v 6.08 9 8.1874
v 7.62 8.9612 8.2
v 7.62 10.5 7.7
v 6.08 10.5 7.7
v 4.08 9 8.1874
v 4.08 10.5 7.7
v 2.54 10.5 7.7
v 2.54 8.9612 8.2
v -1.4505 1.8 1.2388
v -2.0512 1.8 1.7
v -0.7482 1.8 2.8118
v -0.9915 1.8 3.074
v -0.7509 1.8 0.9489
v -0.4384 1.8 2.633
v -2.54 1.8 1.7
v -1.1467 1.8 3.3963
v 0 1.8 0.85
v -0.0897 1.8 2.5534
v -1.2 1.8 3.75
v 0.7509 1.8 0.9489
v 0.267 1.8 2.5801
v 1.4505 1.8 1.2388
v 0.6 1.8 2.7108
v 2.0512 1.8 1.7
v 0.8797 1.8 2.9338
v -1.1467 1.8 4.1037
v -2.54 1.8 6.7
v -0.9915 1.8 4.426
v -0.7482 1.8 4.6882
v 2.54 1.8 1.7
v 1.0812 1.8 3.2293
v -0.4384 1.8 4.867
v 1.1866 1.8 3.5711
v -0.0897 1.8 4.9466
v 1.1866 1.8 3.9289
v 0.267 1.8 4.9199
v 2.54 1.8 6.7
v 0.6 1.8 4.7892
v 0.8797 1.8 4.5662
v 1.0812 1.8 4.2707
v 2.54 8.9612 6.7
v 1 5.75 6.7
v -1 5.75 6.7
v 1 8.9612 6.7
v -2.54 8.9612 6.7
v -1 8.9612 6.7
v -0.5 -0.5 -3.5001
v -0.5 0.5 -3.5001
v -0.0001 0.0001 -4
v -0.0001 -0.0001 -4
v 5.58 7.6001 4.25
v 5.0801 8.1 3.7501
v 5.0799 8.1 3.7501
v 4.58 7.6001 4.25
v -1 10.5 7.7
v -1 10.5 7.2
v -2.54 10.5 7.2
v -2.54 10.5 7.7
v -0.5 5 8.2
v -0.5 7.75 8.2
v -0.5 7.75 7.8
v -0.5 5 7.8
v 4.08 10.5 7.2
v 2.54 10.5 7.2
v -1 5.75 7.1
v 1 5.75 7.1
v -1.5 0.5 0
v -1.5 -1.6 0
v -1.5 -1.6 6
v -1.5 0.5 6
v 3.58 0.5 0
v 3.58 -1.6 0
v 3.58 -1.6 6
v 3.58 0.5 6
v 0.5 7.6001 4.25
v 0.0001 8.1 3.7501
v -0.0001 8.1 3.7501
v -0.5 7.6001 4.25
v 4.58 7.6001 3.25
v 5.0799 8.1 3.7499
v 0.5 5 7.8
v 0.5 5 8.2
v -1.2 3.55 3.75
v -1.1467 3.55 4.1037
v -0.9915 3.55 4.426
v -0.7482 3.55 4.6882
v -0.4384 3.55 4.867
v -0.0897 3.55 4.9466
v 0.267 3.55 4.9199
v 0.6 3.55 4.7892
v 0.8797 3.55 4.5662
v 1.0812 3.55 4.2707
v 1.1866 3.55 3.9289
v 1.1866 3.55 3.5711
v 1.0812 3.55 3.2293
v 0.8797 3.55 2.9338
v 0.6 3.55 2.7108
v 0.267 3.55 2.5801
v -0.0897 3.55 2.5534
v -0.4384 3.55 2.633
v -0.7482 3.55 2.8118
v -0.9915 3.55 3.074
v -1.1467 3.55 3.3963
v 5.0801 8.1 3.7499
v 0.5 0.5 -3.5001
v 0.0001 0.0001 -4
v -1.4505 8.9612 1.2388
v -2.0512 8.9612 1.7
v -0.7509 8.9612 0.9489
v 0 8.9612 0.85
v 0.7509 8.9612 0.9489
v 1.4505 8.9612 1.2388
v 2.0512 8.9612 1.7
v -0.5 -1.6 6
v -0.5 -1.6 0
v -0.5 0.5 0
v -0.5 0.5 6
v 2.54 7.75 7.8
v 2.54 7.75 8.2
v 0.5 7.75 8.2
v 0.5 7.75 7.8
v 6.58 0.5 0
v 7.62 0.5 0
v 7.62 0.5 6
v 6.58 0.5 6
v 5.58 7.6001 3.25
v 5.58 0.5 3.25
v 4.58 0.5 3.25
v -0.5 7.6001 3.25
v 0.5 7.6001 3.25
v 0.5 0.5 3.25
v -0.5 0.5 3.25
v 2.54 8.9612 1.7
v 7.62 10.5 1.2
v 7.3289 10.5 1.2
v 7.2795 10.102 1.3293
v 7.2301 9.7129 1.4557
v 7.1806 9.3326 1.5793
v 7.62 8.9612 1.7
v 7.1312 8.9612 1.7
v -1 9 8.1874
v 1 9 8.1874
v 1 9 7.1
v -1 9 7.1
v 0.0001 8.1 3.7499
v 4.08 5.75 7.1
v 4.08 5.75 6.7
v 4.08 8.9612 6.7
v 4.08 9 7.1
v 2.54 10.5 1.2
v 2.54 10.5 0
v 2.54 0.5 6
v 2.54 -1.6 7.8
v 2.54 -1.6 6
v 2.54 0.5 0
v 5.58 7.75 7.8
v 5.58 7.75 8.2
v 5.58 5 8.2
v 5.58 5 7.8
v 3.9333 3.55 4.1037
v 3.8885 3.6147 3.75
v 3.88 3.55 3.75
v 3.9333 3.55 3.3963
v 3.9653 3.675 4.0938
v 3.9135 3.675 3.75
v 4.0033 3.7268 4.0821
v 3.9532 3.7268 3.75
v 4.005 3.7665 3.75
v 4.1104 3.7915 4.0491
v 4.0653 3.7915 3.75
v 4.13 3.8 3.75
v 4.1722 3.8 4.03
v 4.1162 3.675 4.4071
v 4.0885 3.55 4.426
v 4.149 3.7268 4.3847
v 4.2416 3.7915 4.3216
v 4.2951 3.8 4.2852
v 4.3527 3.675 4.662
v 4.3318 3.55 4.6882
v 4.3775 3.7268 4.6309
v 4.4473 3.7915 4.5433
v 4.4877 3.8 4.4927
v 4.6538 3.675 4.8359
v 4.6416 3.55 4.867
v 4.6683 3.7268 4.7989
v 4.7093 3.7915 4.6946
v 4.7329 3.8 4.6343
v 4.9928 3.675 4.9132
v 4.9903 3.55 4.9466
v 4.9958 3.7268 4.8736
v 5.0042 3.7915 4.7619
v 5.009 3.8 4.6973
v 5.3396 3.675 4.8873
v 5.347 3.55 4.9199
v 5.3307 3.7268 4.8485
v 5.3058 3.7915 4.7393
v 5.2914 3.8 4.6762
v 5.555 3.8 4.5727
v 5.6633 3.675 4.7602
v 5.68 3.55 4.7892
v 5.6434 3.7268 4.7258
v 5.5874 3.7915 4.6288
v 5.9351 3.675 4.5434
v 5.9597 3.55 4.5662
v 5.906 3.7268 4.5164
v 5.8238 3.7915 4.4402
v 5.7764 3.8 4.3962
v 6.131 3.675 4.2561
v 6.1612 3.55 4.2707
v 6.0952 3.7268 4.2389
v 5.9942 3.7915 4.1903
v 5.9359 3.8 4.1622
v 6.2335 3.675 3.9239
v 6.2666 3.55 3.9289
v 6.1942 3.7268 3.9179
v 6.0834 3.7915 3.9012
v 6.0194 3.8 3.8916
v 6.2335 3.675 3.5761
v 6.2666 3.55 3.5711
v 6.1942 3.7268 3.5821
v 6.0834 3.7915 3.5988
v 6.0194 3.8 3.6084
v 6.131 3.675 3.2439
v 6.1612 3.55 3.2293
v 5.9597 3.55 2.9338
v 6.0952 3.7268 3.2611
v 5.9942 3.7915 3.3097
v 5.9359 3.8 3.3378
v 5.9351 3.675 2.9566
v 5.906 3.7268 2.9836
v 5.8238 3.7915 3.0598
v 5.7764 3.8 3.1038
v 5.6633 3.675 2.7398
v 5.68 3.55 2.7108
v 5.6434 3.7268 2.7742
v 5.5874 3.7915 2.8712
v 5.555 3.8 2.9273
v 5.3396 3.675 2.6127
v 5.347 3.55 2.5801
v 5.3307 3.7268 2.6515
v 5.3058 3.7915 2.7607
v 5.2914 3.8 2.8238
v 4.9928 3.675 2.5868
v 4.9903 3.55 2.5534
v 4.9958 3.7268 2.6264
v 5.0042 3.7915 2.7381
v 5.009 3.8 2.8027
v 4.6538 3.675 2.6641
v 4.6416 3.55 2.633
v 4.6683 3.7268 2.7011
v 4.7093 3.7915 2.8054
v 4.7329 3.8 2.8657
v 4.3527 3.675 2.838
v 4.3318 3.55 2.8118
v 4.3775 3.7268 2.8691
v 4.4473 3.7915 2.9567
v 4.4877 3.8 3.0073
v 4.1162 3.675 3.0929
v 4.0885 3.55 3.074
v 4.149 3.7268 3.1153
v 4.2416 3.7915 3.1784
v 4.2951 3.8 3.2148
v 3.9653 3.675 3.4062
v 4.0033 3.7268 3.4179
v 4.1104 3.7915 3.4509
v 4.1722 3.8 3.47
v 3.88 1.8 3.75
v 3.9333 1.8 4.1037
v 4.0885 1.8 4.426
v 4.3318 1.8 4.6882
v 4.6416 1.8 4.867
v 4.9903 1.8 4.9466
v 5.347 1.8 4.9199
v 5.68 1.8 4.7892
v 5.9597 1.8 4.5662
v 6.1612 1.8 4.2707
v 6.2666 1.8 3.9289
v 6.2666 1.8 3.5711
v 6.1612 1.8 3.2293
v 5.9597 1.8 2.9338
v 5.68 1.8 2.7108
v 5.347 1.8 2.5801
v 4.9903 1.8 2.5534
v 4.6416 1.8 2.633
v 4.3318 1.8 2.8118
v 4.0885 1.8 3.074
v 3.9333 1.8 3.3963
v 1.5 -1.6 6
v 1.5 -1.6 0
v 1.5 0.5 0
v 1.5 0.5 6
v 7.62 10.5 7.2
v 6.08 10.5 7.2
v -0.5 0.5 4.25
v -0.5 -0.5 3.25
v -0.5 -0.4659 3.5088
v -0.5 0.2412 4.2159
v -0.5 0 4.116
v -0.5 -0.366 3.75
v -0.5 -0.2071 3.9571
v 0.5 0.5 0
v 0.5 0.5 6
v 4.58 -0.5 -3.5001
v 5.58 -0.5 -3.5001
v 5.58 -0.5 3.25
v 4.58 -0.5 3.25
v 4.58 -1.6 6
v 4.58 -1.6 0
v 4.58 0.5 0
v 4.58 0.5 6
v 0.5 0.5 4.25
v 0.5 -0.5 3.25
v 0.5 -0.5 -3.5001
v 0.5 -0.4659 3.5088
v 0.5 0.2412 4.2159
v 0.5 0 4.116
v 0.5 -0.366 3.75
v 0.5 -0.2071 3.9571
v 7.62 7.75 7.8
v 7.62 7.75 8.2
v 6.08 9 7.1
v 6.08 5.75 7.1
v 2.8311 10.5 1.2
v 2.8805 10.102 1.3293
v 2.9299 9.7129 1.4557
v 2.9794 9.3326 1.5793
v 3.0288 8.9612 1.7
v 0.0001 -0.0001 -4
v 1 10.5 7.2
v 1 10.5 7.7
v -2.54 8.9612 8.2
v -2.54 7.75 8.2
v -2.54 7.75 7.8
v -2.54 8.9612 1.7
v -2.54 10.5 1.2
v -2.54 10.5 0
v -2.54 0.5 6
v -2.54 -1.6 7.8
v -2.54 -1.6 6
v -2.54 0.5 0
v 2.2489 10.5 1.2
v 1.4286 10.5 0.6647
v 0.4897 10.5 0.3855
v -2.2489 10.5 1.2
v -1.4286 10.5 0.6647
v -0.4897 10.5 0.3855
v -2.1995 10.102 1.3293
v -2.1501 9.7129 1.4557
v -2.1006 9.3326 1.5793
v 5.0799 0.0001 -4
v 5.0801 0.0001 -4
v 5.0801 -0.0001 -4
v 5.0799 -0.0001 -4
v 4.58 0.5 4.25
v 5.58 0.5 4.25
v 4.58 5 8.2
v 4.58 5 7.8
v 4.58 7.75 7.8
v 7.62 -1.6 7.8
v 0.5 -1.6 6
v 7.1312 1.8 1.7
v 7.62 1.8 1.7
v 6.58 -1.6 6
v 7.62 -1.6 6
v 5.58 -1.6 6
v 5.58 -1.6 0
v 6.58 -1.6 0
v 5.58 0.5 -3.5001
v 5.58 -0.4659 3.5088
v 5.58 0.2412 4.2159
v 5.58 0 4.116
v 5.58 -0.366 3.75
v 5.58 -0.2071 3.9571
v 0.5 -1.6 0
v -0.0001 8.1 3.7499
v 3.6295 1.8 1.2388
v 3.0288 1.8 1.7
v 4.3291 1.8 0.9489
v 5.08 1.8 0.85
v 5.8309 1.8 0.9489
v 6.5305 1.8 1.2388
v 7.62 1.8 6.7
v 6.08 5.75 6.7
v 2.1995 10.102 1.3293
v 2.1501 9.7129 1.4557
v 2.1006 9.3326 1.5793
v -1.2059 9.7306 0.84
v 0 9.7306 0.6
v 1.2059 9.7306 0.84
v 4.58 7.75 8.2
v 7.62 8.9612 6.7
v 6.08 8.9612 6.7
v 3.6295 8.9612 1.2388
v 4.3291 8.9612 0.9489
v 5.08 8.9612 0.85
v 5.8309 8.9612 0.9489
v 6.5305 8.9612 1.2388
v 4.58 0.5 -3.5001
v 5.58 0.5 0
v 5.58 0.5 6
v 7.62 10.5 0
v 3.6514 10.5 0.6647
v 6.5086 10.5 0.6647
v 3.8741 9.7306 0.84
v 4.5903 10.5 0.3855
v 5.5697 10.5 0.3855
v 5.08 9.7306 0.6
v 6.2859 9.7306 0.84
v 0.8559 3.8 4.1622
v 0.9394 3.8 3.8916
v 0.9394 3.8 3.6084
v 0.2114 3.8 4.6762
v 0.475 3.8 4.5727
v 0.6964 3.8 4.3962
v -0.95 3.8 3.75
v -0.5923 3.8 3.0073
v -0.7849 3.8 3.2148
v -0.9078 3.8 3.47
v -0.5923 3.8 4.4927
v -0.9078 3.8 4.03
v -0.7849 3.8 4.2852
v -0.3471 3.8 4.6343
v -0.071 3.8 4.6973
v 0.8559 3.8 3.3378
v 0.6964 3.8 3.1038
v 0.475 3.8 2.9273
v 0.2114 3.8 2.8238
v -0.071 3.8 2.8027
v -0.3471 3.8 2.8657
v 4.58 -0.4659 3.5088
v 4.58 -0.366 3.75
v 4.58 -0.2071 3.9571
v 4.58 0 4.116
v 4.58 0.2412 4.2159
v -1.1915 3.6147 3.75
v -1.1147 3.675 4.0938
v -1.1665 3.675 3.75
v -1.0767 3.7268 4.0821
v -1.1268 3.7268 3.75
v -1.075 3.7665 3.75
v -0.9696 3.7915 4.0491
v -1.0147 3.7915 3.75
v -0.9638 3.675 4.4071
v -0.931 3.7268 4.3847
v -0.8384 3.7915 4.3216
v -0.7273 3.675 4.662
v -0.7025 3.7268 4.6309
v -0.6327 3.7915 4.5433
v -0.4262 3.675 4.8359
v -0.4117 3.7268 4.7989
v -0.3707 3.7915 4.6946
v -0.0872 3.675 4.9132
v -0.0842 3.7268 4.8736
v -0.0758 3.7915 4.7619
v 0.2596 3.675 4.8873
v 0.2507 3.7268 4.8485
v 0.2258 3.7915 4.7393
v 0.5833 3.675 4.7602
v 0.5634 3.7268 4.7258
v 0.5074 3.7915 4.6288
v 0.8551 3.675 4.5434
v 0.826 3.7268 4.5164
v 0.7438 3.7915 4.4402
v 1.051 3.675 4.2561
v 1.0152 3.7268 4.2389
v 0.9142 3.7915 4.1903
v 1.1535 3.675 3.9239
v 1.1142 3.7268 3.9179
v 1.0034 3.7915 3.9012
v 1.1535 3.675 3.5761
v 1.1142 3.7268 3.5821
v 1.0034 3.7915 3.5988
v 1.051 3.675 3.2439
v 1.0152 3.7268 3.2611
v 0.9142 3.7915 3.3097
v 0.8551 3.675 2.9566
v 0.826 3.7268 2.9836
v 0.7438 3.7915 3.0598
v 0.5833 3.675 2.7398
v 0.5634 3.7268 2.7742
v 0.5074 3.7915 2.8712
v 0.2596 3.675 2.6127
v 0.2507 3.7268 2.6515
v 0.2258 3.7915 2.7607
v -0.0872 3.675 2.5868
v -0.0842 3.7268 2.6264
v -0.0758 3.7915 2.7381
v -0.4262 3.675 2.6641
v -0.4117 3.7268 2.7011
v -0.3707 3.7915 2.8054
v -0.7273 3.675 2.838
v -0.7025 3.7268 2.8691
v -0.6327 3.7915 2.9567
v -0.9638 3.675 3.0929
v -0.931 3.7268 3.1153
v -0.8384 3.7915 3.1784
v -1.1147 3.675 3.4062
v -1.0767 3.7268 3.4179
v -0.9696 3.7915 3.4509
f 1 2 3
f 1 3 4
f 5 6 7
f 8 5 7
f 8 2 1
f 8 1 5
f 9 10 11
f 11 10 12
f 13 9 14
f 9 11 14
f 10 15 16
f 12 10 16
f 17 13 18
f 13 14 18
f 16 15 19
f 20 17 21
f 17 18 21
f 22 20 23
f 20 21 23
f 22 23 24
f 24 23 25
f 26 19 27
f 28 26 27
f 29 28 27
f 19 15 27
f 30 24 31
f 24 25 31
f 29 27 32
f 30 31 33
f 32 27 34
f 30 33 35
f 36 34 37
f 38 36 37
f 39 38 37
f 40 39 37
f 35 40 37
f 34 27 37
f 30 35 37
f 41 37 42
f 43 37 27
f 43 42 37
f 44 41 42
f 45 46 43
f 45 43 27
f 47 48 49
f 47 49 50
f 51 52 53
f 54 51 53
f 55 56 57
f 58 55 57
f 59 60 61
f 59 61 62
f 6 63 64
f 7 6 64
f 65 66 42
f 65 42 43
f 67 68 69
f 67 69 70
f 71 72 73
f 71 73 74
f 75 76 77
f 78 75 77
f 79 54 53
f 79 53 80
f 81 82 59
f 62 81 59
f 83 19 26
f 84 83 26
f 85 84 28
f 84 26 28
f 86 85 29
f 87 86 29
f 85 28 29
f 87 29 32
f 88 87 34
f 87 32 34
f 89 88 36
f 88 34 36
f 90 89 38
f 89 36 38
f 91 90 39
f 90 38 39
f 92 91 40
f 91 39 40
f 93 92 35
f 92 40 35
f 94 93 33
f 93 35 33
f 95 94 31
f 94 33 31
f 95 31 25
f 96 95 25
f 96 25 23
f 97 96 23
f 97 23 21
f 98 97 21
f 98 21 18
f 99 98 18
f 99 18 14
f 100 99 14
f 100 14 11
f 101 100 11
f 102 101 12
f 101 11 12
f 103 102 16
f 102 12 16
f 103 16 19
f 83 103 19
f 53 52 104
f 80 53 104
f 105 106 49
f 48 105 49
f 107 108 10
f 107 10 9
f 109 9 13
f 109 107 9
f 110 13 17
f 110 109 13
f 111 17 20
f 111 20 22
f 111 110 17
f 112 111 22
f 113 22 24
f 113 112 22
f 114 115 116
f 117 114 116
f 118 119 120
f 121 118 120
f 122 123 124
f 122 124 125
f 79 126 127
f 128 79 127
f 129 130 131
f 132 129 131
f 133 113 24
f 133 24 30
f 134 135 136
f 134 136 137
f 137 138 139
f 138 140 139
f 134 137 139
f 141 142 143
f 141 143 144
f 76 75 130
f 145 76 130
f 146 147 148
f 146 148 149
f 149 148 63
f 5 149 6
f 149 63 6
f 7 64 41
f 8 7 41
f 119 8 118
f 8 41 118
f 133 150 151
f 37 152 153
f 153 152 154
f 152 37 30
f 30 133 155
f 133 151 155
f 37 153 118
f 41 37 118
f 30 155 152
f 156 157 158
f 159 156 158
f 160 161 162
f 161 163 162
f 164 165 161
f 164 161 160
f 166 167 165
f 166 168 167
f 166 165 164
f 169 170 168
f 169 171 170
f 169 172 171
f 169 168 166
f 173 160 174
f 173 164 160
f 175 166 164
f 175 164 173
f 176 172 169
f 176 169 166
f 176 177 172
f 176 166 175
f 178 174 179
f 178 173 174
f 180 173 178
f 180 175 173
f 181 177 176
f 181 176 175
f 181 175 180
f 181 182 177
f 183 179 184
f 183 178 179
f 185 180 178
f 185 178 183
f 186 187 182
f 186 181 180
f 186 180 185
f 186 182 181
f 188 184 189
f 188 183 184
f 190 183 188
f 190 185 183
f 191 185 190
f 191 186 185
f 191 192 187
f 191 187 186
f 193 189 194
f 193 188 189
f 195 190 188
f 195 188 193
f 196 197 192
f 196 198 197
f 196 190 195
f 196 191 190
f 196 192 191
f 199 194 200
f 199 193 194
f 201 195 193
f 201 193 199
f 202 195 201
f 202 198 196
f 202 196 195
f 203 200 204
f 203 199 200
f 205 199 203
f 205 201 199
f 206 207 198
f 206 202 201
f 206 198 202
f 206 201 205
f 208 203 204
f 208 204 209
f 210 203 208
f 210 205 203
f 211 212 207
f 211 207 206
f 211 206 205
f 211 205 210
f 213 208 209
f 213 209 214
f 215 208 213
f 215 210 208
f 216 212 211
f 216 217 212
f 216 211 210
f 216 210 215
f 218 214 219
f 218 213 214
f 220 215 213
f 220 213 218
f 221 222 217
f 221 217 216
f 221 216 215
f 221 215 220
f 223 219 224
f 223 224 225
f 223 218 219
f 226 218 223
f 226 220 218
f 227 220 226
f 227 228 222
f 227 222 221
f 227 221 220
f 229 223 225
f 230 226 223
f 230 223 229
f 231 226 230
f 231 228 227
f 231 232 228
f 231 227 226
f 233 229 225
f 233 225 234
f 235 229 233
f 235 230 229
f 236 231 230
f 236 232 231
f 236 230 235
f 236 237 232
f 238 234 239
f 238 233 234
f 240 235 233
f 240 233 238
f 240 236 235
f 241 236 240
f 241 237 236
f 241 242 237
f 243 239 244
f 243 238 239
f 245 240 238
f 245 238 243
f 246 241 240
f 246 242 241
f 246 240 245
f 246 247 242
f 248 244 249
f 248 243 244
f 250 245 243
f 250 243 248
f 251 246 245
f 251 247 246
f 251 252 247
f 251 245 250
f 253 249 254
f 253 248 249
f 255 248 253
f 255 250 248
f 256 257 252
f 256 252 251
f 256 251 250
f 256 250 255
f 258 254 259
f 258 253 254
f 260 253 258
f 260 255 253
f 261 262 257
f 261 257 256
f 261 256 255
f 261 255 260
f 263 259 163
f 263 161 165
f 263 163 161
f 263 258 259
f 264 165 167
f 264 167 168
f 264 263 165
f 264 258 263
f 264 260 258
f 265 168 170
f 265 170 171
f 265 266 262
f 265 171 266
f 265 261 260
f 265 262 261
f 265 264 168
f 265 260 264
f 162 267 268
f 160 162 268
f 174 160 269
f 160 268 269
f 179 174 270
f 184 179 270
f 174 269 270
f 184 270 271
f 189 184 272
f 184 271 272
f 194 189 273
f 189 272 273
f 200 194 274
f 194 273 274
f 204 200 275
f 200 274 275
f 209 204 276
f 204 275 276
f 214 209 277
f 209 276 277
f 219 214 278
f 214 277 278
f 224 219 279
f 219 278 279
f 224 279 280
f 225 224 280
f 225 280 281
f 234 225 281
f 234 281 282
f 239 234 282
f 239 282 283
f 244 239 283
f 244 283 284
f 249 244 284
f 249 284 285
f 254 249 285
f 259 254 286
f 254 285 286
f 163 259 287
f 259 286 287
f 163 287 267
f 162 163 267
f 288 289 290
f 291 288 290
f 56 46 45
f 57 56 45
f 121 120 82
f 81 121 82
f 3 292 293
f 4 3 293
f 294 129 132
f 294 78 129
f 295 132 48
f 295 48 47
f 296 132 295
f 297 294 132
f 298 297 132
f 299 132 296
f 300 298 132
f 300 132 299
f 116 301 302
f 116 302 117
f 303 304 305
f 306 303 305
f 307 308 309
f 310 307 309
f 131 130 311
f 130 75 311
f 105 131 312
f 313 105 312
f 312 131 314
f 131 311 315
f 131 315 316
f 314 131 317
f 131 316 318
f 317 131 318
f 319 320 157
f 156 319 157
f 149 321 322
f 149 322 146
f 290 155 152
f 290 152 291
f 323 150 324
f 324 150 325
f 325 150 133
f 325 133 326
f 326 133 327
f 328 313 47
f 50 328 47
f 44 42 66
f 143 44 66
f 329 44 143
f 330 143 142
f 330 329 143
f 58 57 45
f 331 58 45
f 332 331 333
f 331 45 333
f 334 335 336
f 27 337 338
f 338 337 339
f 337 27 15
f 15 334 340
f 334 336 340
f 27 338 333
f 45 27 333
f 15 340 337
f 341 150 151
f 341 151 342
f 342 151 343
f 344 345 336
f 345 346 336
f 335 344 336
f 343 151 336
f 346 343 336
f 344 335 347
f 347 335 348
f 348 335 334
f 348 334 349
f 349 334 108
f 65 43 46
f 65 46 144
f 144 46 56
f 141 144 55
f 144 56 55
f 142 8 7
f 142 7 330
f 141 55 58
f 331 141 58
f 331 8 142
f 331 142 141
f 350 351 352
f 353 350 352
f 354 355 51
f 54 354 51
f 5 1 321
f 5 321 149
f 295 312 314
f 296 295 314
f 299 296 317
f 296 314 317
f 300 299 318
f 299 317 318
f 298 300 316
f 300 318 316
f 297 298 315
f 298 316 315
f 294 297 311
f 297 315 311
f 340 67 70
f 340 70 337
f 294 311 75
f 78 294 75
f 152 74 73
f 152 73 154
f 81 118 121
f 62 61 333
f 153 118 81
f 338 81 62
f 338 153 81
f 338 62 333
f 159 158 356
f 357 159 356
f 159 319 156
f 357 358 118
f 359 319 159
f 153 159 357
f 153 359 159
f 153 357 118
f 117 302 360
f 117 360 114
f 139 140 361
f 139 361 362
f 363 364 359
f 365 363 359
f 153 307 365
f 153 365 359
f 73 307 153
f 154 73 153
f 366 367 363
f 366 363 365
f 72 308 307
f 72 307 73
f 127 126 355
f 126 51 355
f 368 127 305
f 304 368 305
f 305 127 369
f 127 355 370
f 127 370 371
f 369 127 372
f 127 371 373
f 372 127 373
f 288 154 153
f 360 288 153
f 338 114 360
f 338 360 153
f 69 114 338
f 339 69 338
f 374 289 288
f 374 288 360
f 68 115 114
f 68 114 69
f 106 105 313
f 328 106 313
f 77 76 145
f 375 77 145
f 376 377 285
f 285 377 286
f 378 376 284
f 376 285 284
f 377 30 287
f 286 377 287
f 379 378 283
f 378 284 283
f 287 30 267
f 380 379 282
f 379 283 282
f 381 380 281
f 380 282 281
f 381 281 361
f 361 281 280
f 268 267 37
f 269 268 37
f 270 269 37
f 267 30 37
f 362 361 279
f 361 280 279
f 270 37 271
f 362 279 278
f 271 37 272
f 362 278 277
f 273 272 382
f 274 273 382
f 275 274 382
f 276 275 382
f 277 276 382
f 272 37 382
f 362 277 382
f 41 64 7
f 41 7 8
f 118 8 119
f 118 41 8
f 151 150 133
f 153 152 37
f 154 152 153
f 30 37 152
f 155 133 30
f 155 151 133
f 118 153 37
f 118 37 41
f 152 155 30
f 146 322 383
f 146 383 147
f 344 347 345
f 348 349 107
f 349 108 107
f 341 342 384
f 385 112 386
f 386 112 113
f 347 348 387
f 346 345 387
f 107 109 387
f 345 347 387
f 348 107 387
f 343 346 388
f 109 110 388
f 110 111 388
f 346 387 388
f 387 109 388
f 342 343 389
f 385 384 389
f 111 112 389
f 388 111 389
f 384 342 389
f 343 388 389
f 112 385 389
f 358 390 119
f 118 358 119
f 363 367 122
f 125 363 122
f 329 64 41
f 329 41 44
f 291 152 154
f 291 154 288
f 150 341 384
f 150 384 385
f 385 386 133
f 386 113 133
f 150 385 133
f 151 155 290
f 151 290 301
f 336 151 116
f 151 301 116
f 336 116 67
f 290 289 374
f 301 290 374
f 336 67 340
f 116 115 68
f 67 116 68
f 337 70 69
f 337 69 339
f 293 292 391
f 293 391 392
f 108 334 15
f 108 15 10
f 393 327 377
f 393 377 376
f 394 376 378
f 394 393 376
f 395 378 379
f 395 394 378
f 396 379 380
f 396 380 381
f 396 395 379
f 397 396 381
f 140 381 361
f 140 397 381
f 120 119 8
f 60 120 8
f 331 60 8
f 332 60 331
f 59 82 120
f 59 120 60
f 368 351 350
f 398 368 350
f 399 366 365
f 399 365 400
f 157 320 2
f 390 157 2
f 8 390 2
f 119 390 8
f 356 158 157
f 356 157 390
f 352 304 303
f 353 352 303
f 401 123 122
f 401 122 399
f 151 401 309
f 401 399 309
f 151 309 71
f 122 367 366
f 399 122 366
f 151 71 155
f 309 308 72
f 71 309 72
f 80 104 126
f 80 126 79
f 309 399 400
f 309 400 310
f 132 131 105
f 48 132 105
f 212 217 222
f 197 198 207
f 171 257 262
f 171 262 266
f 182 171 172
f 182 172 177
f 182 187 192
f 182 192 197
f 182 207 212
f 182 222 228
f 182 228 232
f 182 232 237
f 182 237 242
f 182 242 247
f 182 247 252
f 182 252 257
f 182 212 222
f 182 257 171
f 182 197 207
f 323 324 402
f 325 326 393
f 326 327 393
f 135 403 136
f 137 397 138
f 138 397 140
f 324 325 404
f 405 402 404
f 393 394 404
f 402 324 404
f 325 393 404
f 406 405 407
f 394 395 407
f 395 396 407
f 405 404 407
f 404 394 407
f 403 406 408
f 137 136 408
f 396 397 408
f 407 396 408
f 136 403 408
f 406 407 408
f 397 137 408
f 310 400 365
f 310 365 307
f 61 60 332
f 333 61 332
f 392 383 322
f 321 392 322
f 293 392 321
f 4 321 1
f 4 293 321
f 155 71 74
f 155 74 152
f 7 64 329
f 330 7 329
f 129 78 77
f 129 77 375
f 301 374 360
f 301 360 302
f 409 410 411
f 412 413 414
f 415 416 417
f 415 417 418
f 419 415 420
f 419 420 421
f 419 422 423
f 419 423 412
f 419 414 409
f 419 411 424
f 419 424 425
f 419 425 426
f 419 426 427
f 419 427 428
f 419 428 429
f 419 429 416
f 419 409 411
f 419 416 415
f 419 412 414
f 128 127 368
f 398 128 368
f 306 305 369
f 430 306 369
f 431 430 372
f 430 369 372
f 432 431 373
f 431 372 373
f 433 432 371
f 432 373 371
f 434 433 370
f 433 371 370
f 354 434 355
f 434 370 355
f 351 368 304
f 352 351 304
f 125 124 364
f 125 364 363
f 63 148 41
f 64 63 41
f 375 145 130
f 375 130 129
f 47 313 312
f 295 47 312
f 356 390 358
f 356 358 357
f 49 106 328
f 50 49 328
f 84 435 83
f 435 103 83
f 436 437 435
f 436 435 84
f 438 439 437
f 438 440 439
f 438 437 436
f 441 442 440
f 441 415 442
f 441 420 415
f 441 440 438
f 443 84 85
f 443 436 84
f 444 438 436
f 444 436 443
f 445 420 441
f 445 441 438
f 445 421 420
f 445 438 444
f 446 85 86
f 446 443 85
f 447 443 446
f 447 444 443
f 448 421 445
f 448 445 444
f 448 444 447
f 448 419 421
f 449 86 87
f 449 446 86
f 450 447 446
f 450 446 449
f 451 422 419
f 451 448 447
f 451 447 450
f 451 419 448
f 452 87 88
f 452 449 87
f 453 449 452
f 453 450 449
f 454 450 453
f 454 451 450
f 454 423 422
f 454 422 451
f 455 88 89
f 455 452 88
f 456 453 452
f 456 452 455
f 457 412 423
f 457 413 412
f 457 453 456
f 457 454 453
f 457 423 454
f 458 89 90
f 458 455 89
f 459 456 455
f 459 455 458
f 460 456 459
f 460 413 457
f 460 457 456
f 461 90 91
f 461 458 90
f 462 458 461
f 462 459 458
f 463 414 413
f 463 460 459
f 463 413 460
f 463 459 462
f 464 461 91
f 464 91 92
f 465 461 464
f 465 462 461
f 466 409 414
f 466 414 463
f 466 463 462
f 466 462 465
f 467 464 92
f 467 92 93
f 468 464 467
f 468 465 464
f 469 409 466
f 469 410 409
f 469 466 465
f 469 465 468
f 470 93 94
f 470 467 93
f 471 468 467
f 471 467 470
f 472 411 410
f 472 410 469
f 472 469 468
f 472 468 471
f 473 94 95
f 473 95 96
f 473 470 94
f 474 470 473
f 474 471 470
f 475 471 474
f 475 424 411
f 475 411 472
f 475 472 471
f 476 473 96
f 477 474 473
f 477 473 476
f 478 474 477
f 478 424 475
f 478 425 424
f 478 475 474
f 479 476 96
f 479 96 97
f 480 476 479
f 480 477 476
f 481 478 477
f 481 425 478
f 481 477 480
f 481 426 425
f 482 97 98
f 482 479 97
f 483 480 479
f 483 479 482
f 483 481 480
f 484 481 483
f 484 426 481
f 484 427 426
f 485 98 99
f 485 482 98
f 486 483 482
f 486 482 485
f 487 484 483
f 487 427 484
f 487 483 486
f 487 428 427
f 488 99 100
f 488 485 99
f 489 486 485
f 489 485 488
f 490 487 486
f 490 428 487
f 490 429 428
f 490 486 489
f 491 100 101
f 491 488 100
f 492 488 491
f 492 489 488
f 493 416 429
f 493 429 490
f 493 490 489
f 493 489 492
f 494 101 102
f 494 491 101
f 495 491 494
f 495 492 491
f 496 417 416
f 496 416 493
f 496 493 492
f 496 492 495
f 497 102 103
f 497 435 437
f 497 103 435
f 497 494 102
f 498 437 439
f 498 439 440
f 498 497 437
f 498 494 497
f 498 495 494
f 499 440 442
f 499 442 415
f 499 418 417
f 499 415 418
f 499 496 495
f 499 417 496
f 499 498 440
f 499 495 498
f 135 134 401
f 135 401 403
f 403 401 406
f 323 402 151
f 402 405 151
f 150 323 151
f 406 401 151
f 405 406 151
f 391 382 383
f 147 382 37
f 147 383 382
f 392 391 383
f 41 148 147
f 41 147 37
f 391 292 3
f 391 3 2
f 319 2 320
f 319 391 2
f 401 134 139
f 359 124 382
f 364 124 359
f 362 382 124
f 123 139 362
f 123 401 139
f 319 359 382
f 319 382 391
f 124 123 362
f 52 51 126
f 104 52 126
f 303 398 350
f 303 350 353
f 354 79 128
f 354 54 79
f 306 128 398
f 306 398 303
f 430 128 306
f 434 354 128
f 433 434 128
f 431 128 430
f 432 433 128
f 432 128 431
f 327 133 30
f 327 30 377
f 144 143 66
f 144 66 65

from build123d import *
from OCP.BRepFilletAPI import BRepFilletAPI_MakeChamfer

# Parameters (mm, degrees)
SKETCH_1_W             = 5.08
SKETCH_1_H             = 12.1
EXTRUDE_1_DEPTH        = 8.2
CUT_EXTRUDE_1_DEPTH    = 8.7
SKETCH_3_R             = 1.2
EXTRUDE_2_DEPTH        = 2
FILLET_1_R             = 0.25
CHAMFER_1_SIZE         = 0.5
CHAMFER_1_SIZE2        = 1.538841769
SKETCH_4_W             = 2
SKETCH_4_H             = 1.010953213
CUT_EXTRUDE_2_DEPTH    = 4.75
SKETCH_5_W             = 2
SKETCH_5_H             = 1.705458635
CUT_EXTRUDE_3_DEPTH    = 1.5
CHAMFER_2_SIZE         = 0.5
CHAMFER_2_SIZE2        = 1.538841769
SKETCH_6_W             = 5.08
SKETCH_6_H             = 6.6
CUT_EXTRUDE_4_DEPTH    = 0.4
SKETCH_7_W             = 2.04
SKETCH_7_H             = 2.75
CUT_EXTRUDE_5_DEPTH    = 0.4
EXTRUDE_1_2_DEPTH      = 0.5
EXTRUDE_1_2_DEPTH_BACK = 0.5
CHAMFER_3_SIZE         = 0.5
SKETCH_9_W             = 1
SKETCH_9_H             = 2.1
SKETCH_9_W_2           = 1.04
CUT_EXTRUDE_6_DEPTH    = 6
PATTERN_LINEAR_1_COUNT = 2
PATTERN_LINEAR_1_PITCH = 5.08
MOVE_BODY_1_ANGLE      = 180


with BuildPart() as part:
    # Эскиз1 → Extrude 1 (new body)
    with BuildSketch(Plane(origin=(0, 0, 0), x_dir=(1, 0, 0), z_dir=(0, 1, 0))):
        Rectangle(SKETCH_1_W, SKETCH_1_H)
    extrude(amount=EXTRUDE_1_DEPTH)

    # Эскиз2 → Вырез-Вытянуть1 (cut)
    with BuildSketch(Plane.XY.offset(6.05)):
        with BuildLine():
            Line((-2.54, 6.7), (2.54, 6.7))
            Line((2.54, 6.7), (2.54, 1.7))
            Line((2.54, 1.7), (2.05121915, 1.7))
            ThreePointArc((2.05121915, 1.7), (0, 0.85), (-2.05121915, 1.7))
            Line((-2.05121915, 1.7), (-2.54, 1.7))
            Line((-2.54, 1.7), (-2.54, 6.7))
        make_face()
    extrude(amount=-CUT_EXTRUDE_1_DEPTH, mode=Mode.SUBTRACT)

    # Эскиз3 → Бобышка-Вытянуть2 (add)
    with BuildSketch(Plane.XY.offset(-2.65)):
        with Locations((0, 3.75)):
            Circle(SKETCH_3_R)
    extrude(amount=EXTRUDE_2_DEPTH)

    # Скругление1
    fillet_1_edges = [part.edges().sort_by_distance(p)[0] for p in [
        (-1.2, 3.75, -0.65),
    ]]
    fillet(fillet_1_edges, radius=FILLET_1_R)

    # Фаска1: one chamfer whose edges measure the first distance from different faces: ONE call of the kernel's chamfer builder (chamfer() names one face for all edges)
    chamfer_1_edges_1 = [part.edges().sort_by_distance(p)[0] for p in [
        (0, 6.7, 6.05),
    ]]
    chamfer_1_side_1 = [part.faces().sort_by_distance(p)[0] for p in [
        (0, 7.45, 6.05),
    ]]
    chamfer_1_edges_2 = [part.edges().sort_by_distance(p)[0] for p in [
        (2.295609575, 1.7, 6.05),
        (-2.295609575, 1.7, 6.05),
        (0, 0.85, 6.05),
    ]]
    chamfer_1_side_2 = [part.faces().sort_by_distance(p)[0] for p in [
        (0, 0.655214235, 6.05),
    ]]
    chamfer_1 = BRepFilletAPI_MakeChamfer(part.part.solid().wrapped)
    for e in chamfer_1_edges_1:
        chamfer_1.Add(CHAMFER_1_SIZE, CHAMFER_1_SIZE2, e.wrapped, chamfer_1_side_1[0].wrapped)  # the first distance lies on this face
    for e in chamfer_1_edges_2:
        chamfer_1.Add(CHAMFER_1_SIZE, CHAMFER_1_SIZE2, e.wrapped, chamfer_1_side_2[0].wrapped)  # the first distance lies on this face
    add(Compound.cast(chamfer_1.Shape()), mode=Mode.REPLACE)

    # Эскиз4 → Вырез-Вытянуть2 (cut)
    with BuildSketch(Plane.XY.offset(6.05)):
        with Locations((0, 6.594523394)):
            Rectangle(SKETCH_4_W, SKETCH_4_H)
    extrude(amount=-CUT_EXTRUDE_2_DEPTH, mode=Mode.SUBTRACT)

    # Эскиз5 → Вырез-Вытянуть3 (cut)
    with BuildSketch(Plane.XY.offset(6.05)):
        with Locations((0, 7.552729318)):
            Rectangle(SKETCH_5_W, SKETCH_5_H)
    extrude(amount=-CUT_EXTRUDE_3_DEPTH, mode=Mode.SUBTRACT)

    # Фаска2
    chamfer_2_edges = [part.edges().sort_by_distance(p)[0] for p in [
        (-1.77, 8.2, 6.05),
    ]]
    chamfer_2_side = [part.faces().sort_by_distance(p)[0] for p in [
        (-1.77, 7.7, 6.05),
    ]]
    chamfer(chamfer_2_edges, length=CHAMFER_2_SIZE, length2=CHAMFER_2_SIZE2, reference=chamfer_2_side[0])

    # Эскиз6 → Вырез-Вытянуть4 (cut)
    with BuildSketch(Plane(origin=(0, 8.2, 0), x_dir=(1, 0, 0), z_dir=(0, 1, 0))):
        with Locations((0, 2.75)):
            Rectangle(SKETCH_6_W, SKETCH_6_H)
    extrude(amount=-CUT_EXTRUDE_4_DEPTH, mode=Mode.SUBTRACT)

    # Эскиз7 → Вырез-Вытянуть5 (cut)
    with BuildSketch(Plane(origin=(0, 8.2, 0), x_dir=(1, 0, 0), z_dir=(0, 1, 0))):
        with Locations((1.52, -1.925)):
            Rectangle(SKETCH_7_W, SKETCH_7_H)
        with Locations((-1.52, -1.925)):
            Rectangle(SKETCH_7_W, SKETCH_7_H)
    extrude(amount=-CUT_EXTRUDE_5_DEPTH, mode=Mode.SUBTRACT)

    # Эскиз9 → Вырез-Вытянуть6 (cut)
    with BuildSketch(Plane.XZ):
        with Locations((0, -5)):
            Rectangle(SKETCH_9_W, SKETCH_9_H)
        with Locations((-2.02, -5)):
            Rectangle(SKETCH_9_W_2, SKETCH_9_H)
        with Locations((2.02, -5)):
            Rectangle(SKETCH_9_W_2, SKETCH_9_H)
    extrude(amount=-CUT_EXTRUDE_6_DEPTH, mode=Mode.SUBTRACT)


with BuildPart() as body_2:
    # Эскиз8 → Extrude 1 2 (new, two sides: drawn at the far end of the back side and taken through both)
    with BuildSketch(Plane(origin=(0, 0, 0), x_dir=(0, 0, -1), z_dir=(1, 0, 0)).offset(-EXTRUDE_1_2_DEPTH_BACK)):
        with BuildLine():
            Line((-3.65, 3.25), (3.95, 3.25))
            Line((3.95, 3.25), (3.95, -4))
            Line((3.95, -4), (4.95, -4))
            Line((4.95, -4), (4.95, 3.25))
            ThreePointArc((4.95, 3.25), (4.657106781, 3.957106781), (3.95, 4.25))
            Line((3.95, 4.25), (-3.65, 4.25))
            Line((-3.65, 4.25), (-3.65, 3.25))
        make_face()
    extrude(amount=EXTRUDE_1_2_DEPTH + EXTRUDE_1_2_DEPTH_BACK)

    # Фаска3
    chamfer_3_edges = [body_2.edges().sort_by_distance(p)[0] for p in [
        (0, 3.25, 3.65),
        (0, 4.25, 3.65),
        (0, -4, -4.95),
        (0, -4, -3.95),
        (0.5, -4, -4.45),
        (0.5, 3.75, 3.65),
        (-0.5, 3.75, 3.65),
        (-0.5, -4, -4.45),
    ]]
    chamfer(chamfer_3_edges, length=CHAMFER_3_SIZE - 0.0001)  # a hair under: the kernel refuses the full size


with BuildPart() as pattern_linear_1_1:
    # Линейный массив1: pattern copy
    add(body_2.part.moved(Location(Vector(-1, 0, 0) * (1 * PATTERN_LINEAR_1_PITCH))))


with BuildPart() as pattern_linear_1_2:
    # Линейный массив1: pattern copy
    add(part.part.moved(Location(Vector(-1, 0, 0) * (1 * PATTERN_LINEAR_1_PITCH))))


with BuildPart() as body_2_1:
    # Move Body 1: moved
    add(body_2.part.rotate(Axis((0, 0, 0), (0, 0.7071067811865488, 0.7071067811865462)), MOVE_BODY_1_ANGLE))


with BuildPart() as part_1:
    # Move Body 1: moved
    add(part.part.rotate(Axis((0, 0, 0), (0, 0.7071067811865488, 0.7071067811865462)), MOVE_BODY_1_ANGLE))


with BuildPart() as pattern_linear_1_1_1:
    # Move Body 1: moved
    add(pattern_linear_1_1.part.rotate(Axis((0, 0, 0), (0, 0.7071067811865488, 0.7071067811865462)), MOVE_BODY_1_ANGLE))


with BuildPart() as pattern_linear_1_2_1:
    # Move Body 1: moved
    add(pattern_linear_1_2.part.rotate(Axis((0, 0, 0), (0, 0.7071067811865488, 0.7071067811865462)), MOVE_BODY_1_ANGLE))


with BuildPart() as pattern_linear_1_2_2:
    # Move Body 2: read off the stored shape, not the designer's step
    # Move Body 2: moved
    add(pattern_linear_1_2_1.part.moved(Location((0, 4.45, 0))))


with BuildPart() as pattern_linear_1_1_2:
    # Move Body 2 2: moved
    add(pattern_linear_1_1_1.part.moved(Location((0, 4.45, 0))))


with BuildPart() as part_2:
    # Move Body 2 3: moved
    add(part_1.part.moved(Location((0, 4.45, 0))))


with BuildPart() as body_2_2:
    # Move Body 2 4: moved
    add(body_2_1.part.moved(Location((0, 4.45, 0))))


solid = Compound([pattern_linear_1_2_2.part, pattern_linear_1_1_2.part, part_2.part, body_2_2.part])
